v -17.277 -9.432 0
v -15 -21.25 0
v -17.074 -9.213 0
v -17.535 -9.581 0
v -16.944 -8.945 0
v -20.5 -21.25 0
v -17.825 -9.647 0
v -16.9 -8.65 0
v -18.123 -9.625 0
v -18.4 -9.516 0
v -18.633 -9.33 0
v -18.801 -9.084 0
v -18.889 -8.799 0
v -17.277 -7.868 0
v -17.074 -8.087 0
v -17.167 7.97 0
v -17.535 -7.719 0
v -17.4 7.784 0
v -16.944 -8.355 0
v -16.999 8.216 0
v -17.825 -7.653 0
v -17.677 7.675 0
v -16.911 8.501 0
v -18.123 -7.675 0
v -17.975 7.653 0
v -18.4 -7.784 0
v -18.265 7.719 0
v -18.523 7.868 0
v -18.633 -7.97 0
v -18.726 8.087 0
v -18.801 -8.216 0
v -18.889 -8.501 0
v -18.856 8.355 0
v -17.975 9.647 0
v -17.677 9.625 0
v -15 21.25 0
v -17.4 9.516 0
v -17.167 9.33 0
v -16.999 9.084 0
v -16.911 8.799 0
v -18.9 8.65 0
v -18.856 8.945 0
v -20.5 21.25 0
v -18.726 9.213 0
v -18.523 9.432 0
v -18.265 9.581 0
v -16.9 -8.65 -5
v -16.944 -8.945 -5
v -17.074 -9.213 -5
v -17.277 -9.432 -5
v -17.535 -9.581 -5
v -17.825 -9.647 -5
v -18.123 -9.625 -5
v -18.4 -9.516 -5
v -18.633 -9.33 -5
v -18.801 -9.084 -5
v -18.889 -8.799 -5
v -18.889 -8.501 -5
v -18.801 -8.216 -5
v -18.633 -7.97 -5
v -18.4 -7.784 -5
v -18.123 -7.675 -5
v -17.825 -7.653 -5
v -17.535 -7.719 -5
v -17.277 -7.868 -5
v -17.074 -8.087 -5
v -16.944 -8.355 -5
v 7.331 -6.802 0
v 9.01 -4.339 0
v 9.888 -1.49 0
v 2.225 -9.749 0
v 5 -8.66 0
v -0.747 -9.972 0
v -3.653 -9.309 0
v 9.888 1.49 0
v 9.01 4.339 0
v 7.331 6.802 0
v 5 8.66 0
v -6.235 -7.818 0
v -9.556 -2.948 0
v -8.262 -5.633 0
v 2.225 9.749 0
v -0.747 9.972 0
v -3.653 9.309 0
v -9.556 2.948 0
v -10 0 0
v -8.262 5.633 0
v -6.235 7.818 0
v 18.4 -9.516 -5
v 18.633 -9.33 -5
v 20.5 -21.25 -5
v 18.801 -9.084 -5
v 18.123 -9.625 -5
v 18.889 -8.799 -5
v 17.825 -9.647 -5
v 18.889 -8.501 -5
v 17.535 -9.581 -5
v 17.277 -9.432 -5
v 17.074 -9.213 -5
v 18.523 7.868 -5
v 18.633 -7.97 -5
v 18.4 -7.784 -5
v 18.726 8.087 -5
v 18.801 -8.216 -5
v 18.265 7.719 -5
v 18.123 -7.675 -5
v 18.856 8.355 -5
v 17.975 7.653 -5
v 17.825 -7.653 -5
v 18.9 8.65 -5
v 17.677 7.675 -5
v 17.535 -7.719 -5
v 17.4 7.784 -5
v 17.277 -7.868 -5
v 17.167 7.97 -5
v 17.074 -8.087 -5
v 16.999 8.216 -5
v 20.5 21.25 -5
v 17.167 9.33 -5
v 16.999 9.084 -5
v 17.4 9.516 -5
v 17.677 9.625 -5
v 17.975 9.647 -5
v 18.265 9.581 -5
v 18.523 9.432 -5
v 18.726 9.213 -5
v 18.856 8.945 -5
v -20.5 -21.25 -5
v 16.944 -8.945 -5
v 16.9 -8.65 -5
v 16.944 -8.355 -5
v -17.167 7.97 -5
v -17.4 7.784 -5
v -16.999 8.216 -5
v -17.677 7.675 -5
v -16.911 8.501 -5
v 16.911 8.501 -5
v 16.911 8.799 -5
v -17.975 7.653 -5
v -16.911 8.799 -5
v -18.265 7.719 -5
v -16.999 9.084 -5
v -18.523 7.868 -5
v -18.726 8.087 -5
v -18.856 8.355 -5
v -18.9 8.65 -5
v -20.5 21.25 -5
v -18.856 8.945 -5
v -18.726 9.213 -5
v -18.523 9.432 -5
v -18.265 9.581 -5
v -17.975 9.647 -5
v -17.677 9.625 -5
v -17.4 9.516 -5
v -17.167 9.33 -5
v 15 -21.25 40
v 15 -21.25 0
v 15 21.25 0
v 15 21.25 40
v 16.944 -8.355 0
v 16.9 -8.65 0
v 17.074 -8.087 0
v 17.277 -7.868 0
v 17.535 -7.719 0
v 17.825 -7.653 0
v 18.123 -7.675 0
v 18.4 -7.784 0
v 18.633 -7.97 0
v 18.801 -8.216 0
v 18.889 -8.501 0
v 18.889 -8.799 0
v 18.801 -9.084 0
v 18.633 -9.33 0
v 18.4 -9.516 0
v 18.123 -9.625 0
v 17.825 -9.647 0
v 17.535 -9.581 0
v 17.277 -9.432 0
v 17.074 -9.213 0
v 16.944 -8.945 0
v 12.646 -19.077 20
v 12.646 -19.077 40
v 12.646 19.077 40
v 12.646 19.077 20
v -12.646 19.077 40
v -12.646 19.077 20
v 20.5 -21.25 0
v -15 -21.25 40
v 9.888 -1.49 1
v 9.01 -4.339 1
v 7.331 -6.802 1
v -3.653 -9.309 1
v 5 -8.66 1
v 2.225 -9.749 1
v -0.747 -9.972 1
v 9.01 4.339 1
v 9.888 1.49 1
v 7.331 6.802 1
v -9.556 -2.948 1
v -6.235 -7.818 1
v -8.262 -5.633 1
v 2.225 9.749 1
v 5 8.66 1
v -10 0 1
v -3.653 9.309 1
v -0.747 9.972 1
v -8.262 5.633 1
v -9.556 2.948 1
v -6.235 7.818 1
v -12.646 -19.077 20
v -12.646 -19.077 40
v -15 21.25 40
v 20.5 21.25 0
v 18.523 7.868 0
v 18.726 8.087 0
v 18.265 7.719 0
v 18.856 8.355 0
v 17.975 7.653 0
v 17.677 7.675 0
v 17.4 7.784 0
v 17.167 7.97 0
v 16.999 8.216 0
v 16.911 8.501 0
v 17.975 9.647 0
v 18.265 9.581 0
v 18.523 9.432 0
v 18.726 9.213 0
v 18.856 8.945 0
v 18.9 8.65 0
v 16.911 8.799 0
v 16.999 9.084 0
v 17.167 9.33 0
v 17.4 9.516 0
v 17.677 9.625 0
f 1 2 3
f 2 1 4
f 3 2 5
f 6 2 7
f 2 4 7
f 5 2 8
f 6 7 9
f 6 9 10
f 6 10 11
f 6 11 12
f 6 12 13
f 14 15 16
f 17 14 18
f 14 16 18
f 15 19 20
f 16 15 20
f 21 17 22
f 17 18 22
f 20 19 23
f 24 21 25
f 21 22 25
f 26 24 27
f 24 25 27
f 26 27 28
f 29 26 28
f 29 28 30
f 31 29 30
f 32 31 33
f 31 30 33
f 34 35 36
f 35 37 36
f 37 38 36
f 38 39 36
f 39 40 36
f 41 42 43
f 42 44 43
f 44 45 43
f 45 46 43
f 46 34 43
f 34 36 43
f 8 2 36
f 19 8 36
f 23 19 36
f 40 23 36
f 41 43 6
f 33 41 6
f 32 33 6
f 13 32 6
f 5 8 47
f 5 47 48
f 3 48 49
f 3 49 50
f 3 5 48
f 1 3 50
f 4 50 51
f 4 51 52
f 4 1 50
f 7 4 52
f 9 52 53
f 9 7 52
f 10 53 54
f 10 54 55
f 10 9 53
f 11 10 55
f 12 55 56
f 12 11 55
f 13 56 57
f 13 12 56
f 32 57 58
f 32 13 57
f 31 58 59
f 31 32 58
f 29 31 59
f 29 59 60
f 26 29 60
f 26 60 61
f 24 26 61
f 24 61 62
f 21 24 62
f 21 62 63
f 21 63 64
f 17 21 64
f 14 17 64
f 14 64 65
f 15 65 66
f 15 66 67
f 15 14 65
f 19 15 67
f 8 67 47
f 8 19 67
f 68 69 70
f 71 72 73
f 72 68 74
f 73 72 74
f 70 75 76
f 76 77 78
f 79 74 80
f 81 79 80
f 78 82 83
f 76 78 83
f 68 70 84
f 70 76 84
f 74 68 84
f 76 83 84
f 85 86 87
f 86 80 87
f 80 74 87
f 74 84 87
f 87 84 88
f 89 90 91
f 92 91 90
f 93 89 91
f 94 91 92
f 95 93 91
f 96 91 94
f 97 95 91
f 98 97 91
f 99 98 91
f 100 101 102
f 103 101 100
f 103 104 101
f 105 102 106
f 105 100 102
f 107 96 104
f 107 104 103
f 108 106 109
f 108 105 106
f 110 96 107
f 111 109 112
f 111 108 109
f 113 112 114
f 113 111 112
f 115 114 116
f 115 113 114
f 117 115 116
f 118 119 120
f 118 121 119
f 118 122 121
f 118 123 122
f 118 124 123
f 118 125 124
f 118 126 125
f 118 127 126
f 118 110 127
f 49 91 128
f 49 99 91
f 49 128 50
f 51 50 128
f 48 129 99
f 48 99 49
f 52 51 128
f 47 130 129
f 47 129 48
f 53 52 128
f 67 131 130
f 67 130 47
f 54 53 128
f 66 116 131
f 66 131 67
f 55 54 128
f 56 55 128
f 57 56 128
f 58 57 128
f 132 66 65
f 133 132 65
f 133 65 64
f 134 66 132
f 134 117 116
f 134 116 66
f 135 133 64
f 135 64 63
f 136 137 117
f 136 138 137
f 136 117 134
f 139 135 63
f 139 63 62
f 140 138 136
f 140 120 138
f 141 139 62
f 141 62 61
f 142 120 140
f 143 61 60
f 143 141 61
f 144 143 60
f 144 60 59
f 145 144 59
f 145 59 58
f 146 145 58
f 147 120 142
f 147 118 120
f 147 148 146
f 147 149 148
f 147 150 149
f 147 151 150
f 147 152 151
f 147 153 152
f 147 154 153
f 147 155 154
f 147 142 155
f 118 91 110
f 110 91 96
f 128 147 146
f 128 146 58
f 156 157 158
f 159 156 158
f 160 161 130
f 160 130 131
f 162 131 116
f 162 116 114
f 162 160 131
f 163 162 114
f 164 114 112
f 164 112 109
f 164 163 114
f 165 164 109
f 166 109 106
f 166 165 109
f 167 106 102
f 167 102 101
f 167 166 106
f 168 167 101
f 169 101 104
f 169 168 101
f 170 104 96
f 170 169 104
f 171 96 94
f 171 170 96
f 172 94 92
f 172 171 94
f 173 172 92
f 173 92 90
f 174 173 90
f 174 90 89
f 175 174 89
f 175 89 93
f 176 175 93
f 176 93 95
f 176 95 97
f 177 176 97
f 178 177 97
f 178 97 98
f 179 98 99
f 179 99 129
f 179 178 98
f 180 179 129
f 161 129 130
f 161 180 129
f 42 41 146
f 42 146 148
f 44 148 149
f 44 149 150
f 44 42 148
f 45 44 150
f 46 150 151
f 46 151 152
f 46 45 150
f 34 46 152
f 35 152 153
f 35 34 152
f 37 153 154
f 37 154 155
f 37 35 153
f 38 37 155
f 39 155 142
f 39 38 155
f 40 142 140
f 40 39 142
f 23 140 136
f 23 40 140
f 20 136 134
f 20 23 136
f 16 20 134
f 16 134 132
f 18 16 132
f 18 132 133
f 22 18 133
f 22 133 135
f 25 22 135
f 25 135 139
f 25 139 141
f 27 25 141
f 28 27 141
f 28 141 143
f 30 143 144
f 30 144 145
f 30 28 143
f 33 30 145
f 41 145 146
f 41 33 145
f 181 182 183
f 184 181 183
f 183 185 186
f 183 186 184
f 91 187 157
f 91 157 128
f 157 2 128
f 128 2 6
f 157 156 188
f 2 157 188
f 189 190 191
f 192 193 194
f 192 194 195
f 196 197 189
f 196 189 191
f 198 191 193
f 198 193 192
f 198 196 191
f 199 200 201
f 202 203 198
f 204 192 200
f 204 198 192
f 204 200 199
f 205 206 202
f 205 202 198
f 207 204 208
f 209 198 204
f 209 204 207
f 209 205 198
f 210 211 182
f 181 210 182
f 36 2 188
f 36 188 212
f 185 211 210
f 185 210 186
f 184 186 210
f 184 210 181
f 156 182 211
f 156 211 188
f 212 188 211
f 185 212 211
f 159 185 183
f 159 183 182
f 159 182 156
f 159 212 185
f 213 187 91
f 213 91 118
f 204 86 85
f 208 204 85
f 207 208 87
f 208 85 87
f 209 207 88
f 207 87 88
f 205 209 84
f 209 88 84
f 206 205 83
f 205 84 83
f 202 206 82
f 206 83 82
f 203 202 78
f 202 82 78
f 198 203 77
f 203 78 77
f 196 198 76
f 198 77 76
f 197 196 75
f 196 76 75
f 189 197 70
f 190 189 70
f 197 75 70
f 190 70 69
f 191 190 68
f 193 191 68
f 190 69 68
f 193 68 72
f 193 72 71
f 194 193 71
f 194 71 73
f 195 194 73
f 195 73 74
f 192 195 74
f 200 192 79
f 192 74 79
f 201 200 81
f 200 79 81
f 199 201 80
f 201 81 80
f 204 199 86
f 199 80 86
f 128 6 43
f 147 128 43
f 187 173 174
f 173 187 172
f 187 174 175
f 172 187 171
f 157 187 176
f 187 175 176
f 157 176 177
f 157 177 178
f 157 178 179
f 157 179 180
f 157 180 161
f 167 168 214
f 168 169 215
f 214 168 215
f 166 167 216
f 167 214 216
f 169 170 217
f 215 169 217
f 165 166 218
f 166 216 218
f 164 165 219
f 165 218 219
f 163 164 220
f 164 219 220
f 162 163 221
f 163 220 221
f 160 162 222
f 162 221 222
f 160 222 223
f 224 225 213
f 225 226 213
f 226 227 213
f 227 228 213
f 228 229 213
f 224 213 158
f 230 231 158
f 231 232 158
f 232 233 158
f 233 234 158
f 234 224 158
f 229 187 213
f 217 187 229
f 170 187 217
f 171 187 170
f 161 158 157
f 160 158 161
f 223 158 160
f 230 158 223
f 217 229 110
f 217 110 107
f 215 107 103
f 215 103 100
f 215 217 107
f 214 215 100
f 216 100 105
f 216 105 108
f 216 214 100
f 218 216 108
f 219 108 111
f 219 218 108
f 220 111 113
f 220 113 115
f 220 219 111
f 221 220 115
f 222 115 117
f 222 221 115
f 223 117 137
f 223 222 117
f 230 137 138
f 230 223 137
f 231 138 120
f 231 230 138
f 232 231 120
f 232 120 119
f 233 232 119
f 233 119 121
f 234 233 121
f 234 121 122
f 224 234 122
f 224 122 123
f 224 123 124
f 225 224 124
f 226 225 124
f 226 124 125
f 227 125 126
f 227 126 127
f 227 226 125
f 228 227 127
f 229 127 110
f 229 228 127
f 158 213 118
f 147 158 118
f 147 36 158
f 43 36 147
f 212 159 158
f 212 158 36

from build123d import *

# Parameters (mm, degrees)
SKETCH_1_W          = 30
SKETCH_1_H          = 42.5
EXTRUDE_1_DEPTH     = 40
SKETCH_2_W          = 25.29109927
SKETCH_2_H          = 38.153739886
CUT_EXTRUDE_1_DEPTH = 20
SKETCH_3_R          = 10
CUT_EXTRUDE_2_DEPTH = 1
SKETCH_4_W          = 41
SKETCH_4_H          = 42.5
SKETCH_4_R          = 1
EXTRUDE_2_DEPTH     = 5


with BuildPart() as part:
    # 草图1 → 凸台-拉伸1 (new body)
    with BuildSketch(Plane.XY):
        Rectangle(SKETCH_1_W, SKETCH_1_H)
    extrude(amount=EXTRUDE_1_DEPTH)

    # 草图2 → 切除-拉伸1 (cut)
    with BuildSketch(Plane.XY.offset(40)):
        Rectangle(SKETCH_2_W, SKETCH_2_H)
    extrude(amount=-CUT_EXTRUDE_1_DEPTH, mode=Mode.SUBTRACT)

    # 草图3 → 切除-拉伸2 (cut)
    with BuildSketch(Plane(origin=(0, 0, 0), x_dir=(-1, 0, 0), z_dir=(0, 0, -1))):
        Circle(SKETCH_3_R)
    extrude(amount=-CUT_EXTRUDE_2_DEPTH, mode=Mode.SUBTRACT)

    # 草图4 → 凸台-拉伸2 (add)
    with BuildSketch(Plane(origin=(0, 0, 0), x_dir=(-1, 0, 0), z_dir=(0, 0, -1))):
        Rectangle(SKETCH_4_W, SKETCH_4_H)
        with Locations((17.9, 8.65)):
            Circle(SKETCH_4_R, mode=Mode.SUBTRACT)
        with Locations(Location((-17.9, 8.65, 0), (0, 0, 180))):
            Circle(SKETCH_4_R, mode=Mode.SUBTRACT)
        with Locations((-17.9, -8.65)):
            Circle(SKETCH_4_R, mode=Mode.SUBTRACT)
        with Locations(Location((17.9, -8.65, 0), (0, 0, 180))):
            Circle(SKETCH_4_R, mode=Mode.SUBTRACT)
    extrude(amount=EXTRUDE_2_DEPTH)


solid = part.part
